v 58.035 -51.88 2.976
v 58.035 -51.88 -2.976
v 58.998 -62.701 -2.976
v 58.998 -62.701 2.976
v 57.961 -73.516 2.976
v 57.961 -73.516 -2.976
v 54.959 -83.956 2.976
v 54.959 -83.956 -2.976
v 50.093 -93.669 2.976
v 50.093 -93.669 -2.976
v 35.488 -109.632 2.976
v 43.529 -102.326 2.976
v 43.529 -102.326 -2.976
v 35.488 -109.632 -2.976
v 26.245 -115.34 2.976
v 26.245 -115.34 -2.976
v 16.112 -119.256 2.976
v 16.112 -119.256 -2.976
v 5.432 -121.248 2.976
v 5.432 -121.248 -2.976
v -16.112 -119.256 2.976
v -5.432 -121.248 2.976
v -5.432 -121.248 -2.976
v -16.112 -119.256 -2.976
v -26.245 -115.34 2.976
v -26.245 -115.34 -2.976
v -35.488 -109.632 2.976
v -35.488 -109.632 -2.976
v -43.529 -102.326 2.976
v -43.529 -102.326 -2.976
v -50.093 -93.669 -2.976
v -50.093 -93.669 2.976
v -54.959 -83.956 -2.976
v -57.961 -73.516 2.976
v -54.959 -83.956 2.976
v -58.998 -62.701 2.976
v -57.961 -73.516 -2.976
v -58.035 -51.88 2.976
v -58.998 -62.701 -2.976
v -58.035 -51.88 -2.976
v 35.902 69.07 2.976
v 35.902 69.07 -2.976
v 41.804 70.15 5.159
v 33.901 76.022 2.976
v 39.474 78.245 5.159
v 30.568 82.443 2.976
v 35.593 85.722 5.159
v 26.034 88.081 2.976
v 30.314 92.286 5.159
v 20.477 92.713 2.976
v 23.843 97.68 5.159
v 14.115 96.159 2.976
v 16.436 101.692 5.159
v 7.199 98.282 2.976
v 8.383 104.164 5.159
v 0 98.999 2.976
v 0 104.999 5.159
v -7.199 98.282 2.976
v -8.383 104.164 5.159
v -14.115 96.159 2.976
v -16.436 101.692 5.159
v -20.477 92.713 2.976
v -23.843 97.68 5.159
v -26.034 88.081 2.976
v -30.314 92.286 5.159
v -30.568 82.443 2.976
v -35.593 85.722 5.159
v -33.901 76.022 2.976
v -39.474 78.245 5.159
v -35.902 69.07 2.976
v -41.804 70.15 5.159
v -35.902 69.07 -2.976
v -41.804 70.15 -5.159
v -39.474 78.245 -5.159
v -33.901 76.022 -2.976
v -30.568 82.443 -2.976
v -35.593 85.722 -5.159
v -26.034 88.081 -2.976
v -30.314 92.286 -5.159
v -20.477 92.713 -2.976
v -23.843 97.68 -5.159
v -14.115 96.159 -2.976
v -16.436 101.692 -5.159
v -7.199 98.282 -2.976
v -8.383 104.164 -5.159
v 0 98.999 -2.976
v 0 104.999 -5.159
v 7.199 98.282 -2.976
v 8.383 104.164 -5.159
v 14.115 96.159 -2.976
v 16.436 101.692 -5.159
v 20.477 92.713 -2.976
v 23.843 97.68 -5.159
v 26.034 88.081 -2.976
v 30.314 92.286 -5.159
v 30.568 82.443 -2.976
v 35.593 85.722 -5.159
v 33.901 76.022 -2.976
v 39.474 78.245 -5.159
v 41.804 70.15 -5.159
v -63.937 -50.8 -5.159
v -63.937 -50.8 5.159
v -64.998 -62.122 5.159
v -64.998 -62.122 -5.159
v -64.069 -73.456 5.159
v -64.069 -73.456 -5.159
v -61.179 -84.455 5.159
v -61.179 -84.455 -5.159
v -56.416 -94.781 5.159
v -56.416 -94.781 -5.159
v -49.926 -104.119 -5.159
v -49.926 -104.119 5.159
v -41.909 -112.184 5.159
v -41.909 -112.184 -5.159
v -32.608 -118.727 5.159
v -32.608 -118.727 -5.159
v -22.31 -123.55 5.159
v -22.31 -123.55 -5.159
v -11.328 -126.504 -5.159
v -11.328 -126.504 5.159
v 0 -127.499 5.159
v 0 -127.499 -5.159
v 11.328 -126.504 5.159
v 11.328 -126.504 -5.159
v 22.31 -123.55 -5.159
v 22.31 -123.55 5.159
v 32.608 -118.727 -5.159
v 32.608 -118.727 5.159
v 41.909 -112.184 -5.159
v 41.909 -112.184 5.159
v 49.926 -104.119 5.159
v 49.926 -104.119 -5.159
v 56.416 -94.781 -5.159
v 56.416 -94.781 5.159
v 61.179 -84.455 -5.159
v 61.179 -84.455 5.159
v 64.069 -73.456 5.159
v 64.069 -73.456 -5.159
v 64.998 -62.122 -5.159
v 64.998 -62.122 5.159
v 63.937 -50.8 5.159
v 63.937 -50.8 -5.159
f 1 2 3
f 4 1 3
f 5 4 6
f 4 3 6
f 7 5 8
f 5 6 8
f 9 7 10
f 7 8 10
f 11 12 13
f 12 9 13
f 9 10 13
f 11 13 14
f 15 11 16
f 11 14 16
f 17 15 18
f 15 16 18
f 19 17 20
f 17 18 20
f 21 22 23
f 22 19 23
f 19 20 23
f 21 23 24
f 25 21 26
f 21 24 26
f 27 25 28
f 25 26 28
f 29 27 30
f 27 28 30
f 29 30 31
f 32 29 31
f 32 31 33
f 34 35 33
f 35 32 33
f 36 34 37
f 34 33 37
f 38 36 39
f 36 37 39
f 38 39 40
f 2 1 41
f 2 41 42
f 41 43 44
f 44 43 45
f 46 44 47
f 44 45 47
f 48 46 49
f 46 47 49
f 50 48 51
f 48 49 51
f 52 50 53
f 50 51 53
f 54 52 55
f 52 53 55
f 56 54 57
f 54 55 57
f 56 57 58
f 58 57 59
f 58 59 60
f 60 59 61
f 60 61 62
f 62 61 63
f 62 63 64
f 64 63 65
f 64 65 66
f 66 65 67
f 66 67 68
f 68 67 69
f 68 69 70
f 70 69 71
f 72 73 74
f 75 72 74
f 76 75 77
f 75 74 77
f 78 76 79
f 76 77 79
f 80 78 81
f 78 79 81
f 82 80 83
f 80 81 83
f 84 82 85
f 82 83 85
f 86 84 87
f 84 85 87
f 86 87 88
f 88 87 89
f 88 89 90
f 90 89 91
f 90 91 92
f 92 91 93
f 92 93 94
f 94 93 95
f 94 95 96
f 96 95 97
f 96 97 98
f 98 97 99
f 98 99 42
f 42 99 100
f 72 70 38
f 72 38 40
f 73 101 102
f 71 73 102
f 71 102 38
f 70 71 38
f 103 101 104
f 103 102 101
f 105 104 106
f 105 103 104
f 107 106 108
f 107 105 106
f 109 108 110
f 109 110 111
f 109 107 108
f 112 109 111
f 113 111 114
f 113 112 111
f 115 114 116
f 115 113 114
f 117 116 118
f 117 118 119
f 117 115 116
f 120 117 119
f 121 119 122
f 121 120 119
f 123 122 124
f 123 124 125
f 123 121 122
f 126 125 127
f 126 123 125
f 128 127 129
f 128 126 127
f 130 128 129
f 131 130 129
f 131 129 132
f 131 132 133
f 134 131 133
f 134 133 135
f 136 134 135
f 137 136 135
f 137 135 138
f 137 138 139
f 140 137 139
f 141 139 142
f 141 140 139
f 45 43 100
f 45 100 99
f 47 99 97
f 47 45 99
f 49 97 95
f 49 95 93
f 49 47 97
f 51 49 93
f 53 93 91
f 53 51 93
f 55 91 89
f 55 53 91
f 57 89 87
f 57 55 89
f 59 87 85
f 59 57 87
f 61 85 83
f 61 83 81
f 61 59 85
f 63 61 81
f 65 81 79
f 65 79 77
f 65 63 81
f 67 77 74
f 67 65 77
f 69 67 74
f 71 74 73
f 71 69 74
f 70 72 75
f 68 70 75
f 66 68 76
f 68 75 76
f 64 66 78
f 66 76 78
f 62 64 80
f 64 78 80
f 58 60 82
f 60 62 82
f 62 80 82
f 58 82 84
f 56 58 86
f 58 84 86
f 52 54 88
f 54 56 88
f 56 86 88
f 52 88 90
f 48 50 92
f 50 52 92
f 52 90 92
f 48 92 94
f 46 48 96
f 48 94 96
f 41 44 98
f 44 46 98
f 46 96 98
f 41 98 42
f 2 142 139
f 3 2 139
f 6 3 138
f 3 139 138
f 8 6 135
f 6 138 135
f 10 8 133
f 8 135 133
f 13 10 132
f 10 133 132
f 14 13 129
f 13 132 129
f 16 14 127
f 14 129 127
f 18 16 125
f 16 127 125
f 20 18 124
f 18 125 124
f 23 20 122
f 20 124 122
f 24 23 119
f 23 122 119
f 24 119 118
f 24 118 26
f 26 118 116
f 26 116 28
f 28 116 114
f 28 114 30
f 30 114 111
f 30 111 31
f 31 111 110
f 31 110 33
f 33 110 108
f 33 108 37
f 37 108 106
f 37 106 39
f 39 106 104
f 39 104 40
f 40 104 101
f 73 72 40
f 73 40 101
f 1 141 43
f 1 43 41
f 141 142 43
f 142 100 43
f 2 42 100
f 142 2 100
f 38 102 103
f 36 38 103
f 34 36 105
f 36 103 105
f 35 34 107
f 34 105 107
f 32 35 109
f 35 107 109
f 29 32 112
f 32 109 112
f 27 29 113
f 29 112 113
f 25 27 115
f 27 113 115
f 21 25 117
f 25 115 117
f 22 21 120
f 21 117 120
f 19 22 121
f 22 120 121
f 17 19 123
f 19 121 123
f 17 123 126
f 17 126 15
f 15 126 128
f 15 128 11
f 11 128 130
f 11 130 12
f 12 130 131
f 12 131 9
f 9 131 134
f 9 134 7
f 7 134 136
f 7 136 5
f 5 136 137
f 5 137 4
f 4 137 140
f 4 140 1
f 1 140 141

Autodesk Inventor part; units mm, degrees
ref_plane "YZ Plane" through (0, 0, 0) normal (1, 0, 0) x (0, 1, 0)
ref_plane "XZ Plane" through (0, 0, 0) normal (0, 1, 0) x (-1, 0, 0)
ref_plane "XY Plane" through (0, 0, 0) normal (0, 0, 1) x (1, 0, 0)
sketch "Sketch2" plane through (0, 0, 0) normal (0, 0, 1) x (1, 0, 0)
  line L0 (0, 62.5) -> (0, -62.5) construction
  arc A0 (-39.3467, 69.7) -> (39.3467, 69.7) centre (0, 62.5) ccw construction
  arc A1 (61.4792, -51.25) -> (-61.4792, -51.25) centre (0, -62.5) ccw construction
  line L1 (61.4792, -51.25) -> (39.3467, 69.7)
  line L2 (-61.4792, -51.25) -> (-39.3467, 69.7)
  arc A2 (39.3467, 69.7) -> (-39.3467, 69.7) centre (0, 62.5) ccw
  arc A3 (-61.4792, -51.25) -> (61.4792, -51.25) centre (0, -62.5) ccw
  line L3 (0, 62.5) -> (0, 102.5) construction
  point P0 (0, 0)
  point P1 (0, 0)
  dimension "d1" = 125
  dimension "d2" = 80
  dimension "d3" = 125
sketch "Sketch3" plane through (0, 0, 0) normal (1, 0, 0) x (0, 1, 0)
  line L0 (104.9986, 0) -> (98.9986, 0) construction
  line L1 (102.5, 4.25) -> (102.5, -4.25) construction
  line L2 (104.9986, 5.1594) -> (104.9986, -5.1594)
  line L3 (104.9986, -5.1594) -> (98.9986, -2.9756)
  line L4 (98.9986, -2.9756) -> (98.9986, 2.9756)
  line L5 (98.9986, 2.9756) -> (104.9986, 5.1594)
  point P0 (0, 0)
  point P1 (0, 0)
  point P2 (102.5, 0)
  point P3 (102.5, 0)
  point P4 (102.5, 0)
  dimension "d4" = 8.5
  dimension "d5" = 2.4986
  dimension "d6" = 40
  dimension "d7" = 6
sweep "Sweep1" add profiles "Sketch3" path "Sketch2"
equation "\"d4\" = d8"
equation "\"d5\" = d9"
equation "\"d6\" = d10"
equation "\"d7\" = d11"
equation "\"d8\" = 8.5"
equation "\"d9\" = 2.49859"
equation "\"d10\" = 40deg"
equation "\"d11\" = 6"
properties part number "PWTR-0130" material "Rubber"
